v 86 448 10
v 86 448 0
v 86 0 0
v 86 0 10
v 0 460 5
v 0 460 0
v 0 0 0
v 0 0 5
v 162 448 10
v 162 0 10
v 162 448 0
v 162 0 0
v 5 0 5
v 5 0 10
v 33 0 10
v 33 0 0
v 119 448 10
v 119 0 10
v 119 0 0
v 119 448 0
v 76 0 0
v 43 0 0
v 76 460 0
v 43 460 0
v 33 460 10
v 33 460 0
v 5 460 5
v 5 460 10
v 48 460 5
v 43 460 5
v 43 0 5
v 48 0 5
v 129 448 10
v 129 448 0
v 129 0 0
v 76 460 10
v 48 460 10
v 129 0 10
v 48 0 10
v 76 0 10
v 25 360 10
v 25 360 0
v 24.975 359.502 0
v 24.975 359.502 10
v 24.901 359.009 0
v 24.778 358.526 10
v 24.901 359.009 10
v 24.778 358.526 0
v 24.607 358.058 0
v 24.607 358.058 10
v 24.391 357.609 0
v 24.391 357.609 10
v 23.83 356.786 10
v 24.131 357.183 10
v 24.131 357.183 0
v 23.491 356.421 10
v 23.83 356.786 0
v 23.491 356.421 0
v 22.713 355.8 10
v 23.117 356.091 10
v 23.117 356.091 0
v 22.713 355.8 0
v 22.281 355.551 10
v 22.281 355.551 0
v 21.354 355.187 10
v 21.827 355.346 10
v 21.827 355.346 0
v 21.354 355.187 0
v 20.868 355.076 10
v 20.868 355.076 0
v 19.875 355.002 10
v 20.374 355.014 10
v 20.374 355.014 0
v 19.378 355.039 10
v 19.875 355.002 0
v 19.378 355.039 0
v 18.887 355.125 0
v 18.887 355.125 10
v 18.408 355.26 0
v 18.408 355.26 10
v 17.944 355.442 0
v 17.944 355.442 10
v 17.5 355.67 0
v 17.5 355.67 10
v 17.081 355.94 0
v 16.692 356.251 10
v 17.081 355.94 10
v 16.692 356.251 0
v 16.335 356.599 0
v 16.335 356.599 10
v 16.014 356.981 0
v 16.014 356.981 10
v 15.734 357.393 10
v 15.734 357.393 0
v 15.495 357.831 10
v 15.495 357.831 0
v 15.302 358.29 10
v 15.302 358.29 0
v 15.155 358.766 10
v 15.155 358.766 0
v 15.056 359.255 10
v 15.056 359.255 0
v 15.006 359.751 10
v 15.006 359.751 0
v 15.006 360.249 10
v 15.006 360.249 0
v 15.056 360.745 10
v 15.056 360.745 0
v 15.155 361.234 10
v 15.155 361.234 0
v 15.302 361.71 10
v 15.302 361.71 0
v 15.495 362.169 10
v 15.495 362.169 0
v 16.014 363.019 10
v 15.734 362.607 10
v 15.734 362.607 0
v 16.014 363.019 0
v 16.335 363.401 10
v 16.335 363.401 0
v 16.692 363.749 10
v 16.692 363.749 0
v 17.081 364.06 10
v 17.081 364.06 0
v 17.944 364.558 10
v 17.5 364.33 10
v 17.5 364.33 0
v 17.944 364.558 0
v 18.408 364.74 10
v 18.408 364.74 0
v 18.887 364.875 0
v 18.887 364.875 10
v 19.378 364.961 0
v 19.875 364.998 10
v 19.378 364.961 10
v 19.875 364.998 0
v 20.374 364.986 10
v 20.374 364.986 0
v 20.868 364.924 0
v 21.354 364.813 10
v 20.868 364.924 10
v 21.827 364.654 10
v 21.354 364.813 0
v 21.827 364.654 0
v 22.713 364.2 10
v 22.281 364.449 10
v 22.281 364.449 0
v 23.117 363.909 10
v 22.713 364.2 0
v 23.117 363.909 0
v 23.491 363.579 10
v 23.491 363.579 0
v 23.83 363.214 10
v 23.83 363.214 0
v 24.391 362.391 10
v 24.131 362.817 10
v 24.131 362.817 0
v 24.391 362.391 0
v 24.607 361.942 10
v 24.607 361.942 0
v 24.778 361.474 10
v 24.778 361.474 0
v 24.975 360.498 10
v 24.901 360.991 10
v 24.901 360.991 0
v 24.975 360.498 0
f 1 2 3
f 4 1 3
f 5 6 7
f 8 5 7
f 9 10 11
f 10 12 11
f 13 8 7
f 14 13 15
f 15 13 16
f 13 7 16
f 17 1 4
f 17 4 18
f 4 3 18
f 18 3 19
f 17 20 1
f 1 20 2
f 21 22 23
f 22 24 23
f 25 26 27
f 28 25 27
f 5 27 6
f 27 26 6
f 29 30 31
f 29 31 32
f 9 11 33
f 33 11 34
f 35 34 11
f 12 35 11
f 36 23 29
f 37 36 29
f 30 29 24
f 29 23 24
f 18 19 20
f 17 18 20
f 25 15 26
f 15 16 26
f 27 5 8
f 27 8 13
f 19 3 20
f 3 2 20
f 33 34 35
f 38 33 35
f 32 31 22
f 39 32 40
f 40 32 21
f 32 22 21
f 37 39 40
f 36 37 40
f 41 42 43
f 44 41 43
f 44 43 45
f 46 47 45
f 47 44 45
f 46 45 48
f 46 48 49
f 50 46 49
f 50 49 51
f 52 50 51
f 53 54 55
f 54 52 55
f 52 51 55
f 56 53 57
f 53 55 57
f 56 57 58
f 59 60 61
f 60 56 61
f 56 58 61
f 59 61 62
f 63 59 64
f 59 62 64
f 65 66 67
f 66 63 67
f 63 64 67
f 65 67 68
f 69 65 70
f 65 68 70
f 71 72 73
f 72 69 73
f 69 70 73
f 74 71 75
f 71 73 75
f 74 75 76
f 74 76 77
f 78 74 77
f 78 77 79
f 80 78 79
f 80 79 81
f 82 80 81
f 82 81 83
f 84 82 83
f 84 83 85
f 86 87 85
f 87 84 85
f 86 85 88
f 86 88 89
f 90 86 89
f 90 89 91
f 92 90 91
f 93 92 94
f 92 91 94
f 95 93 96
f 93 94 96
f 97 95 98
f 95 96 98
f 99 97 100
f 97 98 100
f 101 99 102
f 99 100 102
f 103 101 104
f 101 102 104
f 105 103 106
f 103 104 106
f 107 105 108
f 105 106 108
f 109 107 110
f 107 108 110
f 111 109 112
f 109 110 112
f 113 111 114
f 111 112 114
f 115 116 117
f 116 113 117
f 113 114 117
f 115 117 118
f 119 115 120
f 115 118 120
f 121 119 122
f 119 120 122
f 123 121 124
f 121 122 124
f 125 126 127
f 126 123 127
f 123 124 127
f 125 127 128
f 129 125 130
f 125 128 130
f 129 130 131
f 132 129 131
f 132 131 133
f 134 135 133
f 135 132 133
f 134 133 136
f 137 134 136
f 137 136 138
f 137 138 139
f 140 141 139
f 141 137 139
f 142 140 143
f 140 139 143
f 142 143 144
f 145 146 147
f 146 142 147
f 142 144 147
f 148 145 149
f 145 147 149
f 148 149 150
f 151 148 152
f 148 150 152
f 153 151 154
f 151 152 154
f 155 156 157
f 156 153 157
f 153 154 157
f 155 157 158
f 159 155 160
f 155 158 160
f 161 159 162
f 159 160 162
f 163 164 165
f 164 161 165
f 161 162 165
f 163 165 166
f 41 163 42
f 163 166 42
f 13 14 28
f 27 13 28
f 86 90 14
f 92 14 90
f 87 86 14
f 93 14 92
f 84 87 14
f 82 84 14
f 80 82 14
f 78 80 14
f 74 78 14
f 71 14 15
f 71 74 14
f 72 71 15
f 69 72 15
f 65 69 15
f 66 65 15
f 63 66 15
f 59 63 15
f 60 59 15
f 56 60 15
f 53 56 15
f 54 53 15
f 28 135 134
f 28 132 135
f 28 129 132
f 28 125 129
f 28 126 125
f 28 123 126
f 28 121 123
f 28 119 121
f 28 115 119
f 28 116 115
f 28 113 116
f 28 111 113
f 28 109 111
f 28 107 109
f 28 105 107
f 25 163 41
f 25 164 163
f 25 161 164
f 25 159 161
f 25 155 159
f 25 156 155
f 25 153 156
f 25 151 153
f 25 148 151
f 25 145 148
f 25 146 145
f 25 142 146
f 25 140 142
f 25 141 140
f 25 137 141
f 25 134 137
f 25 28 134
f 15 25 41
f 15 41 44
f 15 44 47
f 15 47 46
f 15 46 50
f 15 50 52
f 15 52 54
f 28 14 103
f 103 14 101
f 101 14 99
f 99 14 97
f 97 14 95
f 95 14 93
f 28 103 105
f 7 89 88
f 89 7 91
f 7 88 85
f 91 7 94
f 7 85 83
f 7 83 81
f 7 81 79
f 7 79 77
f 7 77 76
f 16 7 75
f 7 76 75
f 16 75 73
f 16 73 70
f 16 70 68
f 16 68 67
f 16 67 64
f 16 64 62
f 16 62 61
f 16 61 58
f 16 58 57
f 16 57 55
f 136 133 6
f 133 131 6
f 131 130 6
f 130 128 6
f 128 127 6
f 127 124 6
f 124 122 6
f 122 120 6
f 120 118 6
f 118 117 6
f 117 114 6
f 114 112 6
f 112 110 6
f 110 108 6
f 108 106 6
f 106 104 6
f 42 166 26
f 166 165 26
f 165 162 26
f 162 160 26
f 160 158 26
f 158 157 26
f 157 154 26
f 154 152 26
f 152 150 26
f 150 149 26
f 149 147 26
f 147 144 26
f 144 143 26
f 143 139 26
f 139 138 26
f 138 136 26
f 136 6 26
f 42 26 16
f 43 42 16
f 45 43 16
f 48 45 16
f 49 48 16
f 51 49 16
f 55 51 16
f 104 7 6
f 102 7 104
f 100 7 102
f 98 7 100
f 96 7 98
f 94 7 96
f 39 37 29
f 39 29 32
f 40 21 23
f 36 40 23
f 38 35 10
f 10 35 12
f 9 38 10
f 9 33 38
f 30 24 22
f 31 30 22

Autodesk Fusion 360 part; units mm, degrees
sketch "Sketch1" plane through (0, 0, 0) normal (0, 0, 1) x (1, 0, 0)
  line L0 (0, 0) -> (33, 0)
  line L1 (33, 0) -> (33, 460)
  line L2 (33, 460) -> (0, 460)
  line L3 (0, 460) -> (0, 0)
  line L4 (76, 460) -> (43, 460)
  line L5 (43, 460) -> (43, 0)
  line L6 (43, 0) -> (76, 0)
  line L7 (76, 0) -> (76, 460)
  line L8 (86, 0) -> (119, 0)
  line L9 (119, 0) -> (119, 448)
  line L10 (119, 448) -> (86, 448)
  line L11 (86, 448) -> (86, 0)
  line L12 (129, 0) -> (162, 0)
  line L13 (162, 0) -> (162, 448)
  line L14 (162, 448) -> (129, 448)
  line L15 (129, 448) -> (129, 0)
  circle A0 centre (20, 360) radius 5
  line L16 (5, 0) -> (5, 460)
  line L17 (48, 460) -> (48, 0)
  dimension "d1" = 33
  dimension "d2" = 460
  dimension "d3" = 33
  dimension "d4" = 460
  dimension "d5" = 10
  dimension "d6" = 33
  dimension "d8" = 10
  dimension "d9" = 33
  dimension "d10" = 448
  dimension "d11" = 10
  dimension "d14" = 10
  dimension "d15" = 20
  dimension "d16" = 100
  dimension "d19" = 5
  dimension "d20" = 5
extrude "Extrude1" add sketch "Sketch1" along normal blind 10 contours L0 L2 L3 L16 | L0 L1 L2 L16 | L4 L6 L7 L17 | L4 L5 L6 L17 | L8 L9 L10 L11 | L12 L13 L14 L15 | A0 makes body 1 at (54, 306.6667, 0) makes body 2 at (11, 306.6667, 0) makes body 3 at (140, 298.6667, 0) makes body 4 at (97, 298.6667, 0)
extrude "Extrude2" cut sketch "Sketch1" along normal blind 10 contours A0 bodies 2
extrude "Extrude3" cut sketch "Sketch1" against normal blind 5 from surface at 10 contours L0 L2 L3 L16 | L4 L5 L6 L17 bodies 1 2
